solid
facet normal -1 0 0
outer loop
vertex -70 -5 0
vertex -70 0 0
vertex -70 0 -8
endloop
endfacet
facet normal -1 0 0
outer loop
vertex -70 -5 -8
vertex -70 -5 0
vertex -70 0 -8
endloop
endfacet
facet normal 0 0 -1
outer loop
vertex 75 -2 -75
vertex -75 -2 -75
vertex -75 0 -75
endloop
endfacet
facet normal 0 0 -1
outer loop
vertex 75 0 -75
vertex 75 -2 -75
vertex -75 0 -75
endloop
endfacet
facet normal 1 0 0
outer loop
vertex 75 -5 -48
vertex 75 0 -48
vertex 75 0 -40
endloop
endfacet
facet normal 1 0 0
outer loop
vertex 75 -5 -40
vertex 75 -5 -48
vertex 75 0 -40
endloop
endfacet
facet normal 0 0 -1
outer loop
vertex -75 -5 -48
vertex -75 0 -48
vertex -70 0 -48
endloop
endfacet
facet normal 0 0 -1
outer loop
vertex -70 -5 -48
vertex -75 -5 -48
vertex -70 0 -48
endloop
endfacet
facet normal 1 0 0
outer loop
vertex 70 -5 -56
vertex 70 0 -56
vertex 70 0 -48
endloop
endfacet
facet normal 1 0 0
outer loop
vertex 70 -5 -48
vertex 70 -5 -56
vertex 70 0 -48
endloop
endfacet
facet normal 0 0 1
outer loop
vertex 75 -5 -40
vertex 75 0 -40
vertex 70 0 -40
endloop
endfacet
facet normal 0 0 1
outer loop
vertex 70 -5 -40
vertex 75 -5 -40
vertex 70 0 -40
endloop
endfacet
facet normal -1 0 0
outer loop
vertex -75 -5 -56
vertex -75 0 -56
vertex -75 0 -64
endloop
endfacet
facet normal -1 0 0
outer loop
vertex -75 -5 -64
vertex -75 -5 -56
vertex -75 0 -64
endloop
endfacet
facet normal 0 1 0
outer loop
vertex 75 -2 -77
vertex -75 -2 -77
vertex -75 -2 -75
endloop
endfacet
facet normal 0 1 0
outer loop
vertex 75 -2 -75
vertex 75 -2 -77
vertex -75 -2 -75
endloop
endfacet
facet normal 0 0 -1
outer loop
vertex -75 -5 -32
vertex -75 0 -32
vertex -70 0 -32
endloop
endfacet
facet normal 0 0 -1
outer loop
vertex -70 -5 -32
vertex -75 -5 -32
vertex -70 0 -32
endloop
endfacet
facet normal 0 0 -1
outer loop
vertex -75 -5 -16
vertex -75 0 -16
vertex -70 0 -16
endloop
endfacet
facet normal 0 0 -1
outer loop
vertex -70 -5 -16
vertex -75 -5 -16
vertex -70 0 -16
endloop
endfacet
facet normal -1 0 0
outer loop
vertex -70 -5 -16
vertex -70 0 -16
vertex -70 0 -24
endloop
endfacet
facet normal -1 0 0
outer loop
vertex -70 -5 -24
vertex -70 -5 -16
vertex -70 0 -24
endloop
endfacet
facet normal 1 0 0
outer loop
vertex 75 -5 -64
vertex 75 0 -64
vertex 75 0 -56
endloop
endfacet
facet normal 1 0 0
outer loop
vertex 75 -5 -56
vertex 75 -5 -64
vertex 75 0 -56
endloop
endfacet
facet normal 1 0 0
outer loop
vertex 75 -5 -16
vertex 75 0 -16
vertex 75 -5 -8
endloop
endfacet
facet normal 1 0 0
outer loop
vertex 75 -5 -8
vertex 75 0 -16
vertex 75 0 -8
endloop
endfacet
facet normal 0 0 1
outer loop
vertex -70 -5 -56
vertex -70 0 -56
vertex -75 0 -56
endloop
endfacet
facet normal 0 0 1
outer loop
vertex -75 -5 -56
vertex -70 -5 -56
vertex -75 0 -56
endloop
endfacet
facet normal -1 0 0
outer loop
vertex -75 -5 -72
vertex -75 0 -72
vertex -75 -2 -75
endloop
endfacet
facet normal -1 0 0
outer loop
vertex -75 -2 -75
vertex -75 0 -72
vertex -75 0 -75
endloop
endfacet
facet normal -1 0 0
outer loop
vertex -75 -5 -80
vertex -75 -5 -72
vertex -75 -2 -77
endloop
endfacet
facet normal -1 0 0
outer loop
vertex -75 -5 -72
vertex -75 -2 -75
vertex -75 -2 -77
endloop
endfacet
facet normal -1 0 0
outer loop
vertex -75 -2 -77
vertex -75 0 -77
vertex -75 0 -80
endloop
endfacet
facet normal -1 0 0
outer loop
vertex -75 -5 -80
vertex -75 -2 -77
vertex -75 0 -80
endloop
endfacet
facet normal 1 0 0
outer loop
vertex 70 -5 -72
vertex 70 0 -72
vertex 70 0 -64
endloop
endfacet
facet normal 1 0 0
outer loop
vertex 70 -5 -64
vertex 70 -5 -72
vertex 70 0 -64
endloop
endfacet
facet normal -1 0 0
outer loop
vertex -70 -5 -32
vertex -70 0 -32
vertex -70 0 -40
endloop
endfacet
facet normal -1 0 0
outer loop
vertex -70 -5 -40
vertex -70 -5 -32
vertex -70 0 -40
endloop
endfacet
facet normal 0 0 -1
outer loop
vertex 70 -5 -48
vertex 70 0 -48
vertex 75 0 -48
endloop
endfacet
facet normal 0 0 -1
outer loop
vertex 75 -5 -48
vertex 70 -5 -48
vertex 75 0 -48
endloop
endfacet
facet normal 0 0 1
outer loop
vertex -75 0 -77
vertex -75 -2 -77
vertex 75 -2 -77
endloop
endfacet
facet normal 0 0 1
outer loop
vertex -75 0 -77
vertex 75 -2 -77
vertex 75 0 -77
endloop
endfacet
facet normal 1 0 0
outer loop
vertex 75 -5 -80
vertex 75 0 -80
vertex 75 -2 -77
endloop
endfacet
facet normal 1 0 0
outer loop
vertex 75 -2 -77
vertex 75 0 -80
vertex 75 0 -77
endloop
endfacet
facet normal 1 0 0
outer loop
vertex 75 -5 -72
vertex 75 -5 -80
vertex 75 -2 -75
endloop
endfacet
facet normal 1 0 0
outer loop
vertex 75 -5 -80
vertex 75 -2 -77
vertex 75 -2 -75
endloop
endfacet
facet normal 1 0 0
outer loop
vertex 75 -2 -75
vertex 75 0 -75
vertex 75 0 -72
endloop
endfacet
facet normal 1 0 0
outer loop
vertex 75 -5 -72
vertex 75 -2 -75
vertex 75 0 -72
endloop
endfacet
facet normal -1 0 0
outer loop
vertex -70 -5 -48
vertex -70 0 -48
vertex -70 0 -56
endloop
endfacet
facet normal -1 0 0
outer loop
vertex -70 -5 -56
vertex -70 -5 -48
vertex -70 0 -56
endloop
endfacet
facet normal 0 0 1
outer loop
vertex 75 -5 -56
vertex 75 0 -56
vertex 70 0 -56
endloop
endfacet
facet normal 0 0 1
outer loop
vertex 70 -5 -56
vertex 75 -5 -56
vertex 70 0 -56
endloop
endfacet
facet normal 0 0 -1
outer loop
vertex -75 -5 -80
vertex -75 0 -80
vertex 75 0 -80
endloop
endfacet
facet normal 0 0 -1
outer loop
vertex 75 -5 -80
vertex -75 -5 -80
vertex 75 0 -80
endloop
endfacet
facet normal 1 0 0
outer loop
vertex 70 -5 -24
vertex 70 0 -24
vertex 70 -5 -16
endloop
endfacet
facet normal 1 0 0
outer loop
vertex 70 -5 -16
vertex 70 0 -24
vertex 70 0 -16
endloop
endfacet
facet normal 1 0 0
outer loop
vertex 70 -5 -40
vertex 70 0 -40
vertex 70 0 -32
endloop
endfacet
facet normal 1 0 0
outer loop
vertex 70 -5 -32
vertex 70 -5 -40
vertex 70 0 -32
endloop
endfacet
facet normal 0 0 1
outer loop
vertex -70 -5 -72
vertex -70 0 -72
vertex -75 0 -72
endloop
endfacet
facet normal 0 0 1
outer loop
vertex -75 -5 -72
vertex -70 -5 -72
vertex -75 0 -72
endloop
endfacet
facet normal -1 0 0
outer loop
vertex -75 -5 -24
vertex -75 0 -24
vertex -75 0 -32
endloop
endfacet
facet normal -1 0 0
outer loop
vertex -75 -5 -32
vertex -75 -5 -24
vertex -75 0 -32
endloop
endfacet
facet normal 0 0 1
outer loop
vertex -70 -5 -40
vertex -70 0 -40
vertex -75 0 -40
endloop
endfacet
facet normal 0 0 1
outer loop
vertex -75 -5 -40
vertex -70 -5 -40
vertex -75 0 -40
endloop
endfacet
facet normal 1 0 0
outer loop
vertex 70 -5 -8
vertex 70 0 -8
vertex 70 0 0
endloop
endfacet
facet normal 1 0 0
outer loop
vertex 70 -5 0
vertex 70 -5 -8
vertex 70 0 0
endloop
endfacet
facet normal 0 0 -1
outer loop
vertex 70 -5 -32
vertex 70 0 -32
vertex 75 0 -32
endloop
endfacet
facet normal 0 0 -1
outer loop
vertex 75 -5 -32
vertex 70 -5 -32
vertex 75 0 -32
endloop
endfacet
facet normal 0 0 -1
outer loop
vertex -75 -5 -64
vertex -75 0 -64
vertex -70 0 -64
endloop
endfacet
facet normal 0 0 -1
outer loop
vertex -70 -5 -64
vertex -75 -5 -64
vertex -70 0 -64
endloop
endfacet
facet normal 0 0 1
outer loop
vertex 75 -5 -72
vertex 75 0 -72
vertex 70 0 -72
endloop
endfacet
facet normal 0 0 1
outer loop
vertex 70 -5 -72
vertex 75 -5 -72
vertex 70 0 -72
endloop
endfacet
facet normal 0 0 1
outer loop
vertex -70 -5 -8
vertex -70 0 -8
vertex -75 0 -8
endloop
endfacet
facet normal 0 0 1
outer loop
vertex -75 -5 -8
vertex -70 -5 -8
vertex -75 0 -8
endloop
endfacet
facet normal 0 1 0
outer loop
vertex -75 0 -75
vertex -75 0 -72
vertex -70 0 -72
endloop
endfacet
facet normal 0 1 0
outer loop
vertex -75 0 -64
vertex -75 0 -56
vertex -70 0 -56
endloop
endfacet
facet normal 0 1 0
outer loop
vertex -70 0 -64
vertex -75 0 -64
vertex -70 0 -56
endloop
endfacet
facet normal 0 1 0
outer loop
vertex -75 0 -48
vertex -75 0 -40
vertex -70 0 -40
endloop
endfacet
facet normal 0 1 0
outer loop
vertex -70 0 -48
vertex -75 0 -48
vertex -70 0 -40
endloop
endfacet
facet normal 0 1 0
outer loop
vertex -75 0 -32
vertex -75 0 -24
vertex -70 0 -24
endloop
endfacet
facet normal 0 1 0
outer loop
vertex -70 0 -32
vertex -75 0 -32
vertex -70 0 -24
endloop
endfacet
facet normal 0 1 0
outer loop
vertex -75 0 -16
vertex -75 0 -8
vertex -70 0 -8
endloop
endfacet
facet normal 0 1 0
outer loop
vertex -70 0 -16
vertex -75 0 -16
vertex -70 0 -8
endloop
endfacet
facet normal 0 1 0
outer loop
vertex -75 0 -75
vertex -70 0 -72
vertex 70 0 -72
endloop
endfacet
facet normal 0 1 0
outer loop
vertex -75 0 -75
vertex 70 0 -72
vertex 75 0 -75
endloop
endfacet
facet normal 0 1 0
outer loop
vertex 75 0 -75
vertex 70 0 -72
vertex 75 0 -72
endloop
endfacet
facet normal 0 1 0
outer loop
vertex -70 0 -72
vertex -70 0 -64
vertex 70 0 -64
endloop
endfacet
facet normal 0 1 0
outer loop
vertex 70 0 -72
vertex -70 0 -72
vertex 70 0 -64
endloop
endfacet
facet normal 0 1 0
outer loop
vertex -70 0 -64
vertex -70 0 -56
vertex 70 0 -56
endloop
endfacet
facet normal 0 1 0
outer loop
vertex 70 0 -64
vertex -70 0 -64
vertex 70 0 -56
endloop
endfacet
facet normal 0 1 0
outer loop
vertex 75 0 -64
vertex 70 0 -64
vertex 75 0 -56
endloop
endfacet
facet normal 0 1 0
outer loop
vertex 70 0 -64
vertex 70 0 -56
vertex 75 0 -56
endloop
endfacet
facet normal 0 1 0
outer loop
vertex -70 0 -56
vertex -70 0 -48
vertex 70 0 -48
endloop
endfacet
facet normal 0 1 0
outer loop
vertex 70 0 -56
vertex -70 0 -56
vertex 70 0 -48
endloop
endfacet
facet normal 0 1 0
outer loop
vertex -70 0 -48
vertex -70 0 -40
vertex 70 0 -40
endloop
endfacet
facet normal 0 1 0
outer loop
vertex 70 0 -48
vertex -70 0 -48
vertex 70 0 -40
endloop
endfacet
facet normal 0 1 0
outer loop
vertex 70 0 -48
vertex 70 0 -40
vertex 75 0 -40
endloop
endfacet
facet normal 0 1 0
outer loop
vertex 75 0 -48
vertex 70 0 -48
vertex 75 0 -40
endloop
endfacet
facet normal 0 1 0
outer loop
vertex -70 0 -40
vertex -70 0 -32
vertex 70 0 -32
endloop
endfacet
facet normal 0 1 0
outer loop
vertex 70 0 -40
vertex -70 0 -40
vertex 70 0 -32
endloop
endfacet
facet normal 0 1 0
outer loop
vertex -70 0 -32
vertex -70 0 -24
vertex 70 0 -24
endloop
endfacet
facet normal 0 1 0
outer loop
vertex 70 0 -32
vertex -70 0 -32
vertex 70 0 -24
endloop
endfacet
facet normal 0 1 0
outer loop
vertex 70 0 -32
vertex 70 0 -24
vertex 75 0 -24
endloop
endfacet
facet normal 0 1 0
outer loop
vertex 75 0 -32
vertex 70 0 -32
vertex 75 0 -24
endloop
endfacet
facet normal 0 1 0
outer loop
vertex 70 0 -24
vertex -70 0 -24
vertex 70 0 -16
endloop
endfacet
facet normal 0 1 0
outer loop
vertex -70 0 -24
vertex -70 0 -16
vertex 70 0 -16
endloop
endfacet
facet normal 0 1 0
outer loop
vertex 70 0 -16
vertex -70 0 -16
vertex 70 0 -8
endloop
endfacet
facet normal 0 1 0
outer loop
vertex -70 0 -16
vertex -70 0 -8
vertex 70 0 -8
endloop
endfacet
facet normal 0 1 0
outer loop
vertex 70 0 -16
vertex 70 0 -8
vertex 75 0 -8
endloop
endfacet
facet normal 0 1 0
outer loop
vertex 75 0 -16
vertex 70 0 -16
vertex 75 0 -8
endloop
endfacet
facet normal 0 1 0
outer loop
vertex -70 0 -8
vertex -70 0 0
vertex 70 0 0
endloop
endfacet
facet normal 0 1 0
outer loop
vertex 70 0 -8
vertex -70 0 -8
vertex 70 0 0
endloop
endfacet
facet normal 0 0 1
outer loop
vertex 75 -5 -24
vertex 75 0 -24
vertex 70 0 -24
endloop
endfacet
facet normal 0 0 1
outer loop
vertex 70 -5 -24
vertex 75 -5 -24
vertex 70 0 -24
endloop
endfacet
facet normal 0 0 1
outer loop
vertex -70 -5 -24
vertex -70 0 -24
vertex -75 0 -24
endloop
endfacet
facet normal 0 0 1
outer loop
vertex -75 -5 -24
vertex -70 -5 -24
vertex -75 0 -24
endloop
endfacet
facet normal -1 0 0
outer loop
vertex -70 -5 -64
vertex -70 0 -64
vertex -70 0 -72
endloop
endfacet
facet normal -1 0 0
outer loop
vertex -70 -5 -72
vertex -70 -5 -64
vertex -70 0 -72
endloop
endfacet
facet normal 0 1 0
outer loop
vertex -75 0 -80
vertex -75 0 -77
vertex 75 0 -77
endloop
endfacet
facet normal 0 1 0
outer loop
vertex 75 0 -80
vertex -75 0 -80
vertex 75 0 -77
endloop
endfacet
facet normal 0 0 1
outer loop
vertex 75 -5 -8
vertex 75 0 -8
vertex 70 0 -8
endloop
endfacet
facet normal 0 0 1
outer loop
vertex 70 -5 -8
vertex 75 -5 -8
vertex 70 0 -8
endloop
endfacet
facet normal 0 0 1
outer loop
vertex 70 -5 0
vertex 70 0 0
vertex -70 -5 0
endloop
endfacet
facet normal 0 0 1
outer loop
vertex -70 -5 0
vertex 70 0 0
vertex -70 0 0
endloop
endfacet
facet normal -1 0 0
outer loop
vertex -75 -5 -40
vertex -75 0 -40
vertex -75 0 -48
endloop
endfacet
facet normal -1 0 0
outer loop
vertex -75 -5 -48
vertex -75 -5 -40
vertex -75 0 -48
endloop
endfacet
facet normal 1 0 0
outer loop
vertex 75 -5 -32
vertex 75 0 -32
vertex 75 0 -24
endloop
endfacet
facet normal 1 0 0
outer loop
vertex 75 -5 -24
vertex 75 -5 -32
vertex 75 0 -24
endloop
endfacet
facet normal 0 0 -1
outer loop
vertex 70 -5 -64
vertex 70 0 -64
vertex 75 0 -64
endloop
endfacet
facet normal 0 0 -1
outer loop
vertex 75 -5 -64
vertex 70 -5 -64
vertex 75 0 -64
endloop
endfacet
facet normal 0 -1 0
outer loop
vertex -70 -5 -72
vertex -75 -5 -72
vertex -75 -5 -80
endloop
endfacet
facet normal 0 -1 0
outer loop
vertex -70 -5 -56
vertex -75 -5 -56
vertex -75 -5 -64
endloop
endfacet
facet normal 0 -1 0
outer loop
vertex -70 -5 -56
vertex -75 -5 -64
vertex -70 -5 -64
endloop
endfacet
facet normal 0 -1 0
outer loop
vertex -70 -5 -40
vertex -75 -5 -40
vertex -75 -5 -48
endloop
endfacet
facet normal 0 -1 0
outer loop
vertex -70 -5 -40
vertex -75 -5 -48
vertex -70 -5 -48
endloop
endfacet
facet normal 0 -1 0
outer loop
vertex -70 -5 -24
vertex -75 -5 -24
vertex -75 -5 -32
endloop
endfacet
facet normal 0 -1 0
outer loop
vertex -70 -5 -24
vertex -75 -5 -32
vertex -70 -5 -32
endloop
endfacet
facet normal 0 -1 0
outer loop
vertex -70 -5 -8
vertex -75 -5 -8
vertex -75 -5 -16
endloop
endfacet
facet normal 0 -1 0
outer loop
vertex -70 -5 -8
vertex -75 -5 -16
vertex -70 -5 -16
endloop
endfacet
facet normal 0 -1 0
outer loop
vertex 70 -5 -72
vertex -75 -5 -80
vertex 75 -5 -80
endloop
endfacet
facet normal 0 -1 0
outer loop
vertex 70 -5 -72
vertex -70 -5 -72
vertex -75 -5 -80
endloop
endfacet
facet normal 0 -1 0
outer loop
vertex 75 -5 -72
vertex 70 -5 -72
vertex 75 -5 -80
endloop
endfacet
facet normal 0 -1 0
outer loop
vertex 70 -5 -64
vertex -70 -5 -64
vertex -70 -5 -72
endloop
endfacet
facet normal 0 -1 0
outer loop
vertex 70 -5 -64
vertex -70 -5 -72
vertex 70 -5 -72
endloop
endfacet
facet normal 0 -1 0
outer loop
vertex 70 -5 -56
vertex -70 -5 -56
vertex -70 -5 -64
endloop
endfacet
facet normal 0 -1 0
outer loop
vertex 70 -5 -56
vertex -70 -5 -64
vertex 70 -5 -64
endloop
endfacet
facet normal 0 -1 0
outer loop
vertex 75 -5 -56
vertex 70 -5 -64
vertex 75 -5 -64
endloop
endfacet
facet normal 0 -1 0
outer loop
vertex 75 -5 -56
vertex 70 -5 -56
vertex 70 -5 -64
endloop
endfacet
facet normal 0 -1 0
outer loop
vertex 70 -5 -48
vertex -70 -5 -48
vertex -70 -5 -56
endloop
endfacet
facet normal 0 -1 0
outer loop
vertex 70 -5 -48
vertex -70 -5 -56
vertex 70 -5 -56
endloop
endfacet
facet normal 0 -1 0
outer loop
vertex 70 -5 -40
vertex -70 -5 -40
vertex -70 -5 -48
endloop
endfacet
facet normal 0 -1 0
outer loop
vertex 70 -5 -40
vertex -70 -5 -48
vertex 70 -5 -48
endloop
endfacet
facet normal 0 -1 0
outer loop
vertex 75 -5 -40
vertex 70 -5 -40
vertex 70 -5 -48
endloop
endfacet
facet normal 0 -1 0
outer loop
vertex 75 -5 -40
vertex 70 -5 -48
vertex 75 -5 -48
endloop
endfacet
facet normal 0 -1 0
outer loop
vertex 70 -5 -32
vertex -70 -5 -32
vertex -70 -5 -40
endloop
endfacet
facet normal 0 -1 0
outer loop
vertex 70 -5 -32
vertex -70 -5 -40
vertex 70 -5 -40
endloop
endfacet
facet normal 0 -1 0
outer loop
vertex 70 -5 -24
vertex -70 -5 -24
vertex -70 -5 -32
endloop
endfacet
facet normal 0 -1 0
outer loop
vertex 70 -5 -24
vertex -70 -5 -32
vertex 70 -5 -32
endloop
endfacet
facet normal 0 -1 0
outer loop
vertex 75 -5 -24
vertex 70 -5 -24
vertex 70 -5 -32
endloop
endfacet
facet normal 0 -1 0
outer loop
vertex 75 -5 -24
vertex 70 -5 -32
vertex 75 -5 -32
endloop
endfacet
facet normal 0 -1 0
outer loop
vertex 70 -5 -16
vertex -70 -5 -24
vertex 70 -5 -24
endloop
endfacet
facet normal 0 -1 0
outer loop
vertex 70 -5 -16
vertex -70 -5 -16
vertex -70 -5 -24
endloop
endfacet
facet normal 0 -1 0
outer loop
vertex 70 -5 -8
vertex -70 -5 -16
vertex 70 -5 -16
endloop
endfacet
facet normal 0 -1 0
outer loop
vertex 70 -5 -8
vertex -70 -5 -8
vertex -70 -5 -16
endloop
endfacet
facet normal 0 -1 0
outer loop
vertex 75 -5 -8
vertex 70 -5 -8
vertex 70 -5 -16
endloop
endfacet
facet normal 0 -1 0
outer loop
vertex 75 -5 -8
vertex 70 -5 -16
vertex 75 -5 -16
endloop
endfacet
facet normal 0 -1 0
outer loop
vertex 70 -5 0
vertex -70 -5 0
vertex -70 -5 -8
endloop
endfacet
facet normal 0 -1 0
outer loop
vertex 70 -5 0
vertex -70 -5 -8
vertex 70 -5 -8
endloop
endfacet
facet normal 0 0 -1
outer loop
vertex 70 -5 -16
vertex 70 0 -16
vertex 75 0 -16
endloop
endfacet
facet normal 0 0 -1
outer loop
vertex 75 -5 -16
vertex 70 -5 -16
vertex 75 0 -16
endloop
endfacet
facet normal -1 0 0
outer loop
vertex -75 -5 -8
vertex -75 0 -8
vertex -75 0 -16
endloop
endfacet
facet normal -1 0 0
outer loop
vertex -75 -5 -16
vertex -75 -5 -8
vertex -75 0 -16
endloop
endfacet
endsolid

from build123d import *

# Parameters (mm, degrees)
F2_DEPTH = 5
F3_W     = 2
F3_H     = 2
F4_DEPTH = 150.001


# Not quite as in the source:
# - a feature names something its author has since deleted; it is built from what else it names


with BuildPart() as f2:
    # F1 (on Front) → F2 (new body)
    with BuildSketch(Plane.XZ):
        Polygon((70, -8), (70, 0), (-70, 0), (-70, -8), (-75, -8), (-75, -16), (-70, -16), (-70, -24), (-75, -24), (-75, -32), (-70, -32), (-70, -40), (-75, -40), (-75, -48), (-70, -48), (-70, -56), (-75, -56), (-75, -64), (-70, -64), (-70, -72), (-75, -72), (-75, -80), (75, -80), (75, -72), (70, -72), (70, -64), (75, -64), (75, -56), (70, -56), (70, -48), (75, -48), (75, -40), (70, -40), (70, -32), (75, -32), (75, -24), (70, -24), (70, -16), (75, -16), (75, -8), align=None)
    extrude(amount=F2_DEPTH)

    # F3 (on face) → F4 (cut, through all)
    with BuildSketch(Plane.YZ.offset(75)):
        with Locations((-1, -76)):
            Rectangle(F3_W, F3_H)
    extrude(amount=-F4_DEPTH, mode=Mode.SUBTRACT)


solid = f2.part
